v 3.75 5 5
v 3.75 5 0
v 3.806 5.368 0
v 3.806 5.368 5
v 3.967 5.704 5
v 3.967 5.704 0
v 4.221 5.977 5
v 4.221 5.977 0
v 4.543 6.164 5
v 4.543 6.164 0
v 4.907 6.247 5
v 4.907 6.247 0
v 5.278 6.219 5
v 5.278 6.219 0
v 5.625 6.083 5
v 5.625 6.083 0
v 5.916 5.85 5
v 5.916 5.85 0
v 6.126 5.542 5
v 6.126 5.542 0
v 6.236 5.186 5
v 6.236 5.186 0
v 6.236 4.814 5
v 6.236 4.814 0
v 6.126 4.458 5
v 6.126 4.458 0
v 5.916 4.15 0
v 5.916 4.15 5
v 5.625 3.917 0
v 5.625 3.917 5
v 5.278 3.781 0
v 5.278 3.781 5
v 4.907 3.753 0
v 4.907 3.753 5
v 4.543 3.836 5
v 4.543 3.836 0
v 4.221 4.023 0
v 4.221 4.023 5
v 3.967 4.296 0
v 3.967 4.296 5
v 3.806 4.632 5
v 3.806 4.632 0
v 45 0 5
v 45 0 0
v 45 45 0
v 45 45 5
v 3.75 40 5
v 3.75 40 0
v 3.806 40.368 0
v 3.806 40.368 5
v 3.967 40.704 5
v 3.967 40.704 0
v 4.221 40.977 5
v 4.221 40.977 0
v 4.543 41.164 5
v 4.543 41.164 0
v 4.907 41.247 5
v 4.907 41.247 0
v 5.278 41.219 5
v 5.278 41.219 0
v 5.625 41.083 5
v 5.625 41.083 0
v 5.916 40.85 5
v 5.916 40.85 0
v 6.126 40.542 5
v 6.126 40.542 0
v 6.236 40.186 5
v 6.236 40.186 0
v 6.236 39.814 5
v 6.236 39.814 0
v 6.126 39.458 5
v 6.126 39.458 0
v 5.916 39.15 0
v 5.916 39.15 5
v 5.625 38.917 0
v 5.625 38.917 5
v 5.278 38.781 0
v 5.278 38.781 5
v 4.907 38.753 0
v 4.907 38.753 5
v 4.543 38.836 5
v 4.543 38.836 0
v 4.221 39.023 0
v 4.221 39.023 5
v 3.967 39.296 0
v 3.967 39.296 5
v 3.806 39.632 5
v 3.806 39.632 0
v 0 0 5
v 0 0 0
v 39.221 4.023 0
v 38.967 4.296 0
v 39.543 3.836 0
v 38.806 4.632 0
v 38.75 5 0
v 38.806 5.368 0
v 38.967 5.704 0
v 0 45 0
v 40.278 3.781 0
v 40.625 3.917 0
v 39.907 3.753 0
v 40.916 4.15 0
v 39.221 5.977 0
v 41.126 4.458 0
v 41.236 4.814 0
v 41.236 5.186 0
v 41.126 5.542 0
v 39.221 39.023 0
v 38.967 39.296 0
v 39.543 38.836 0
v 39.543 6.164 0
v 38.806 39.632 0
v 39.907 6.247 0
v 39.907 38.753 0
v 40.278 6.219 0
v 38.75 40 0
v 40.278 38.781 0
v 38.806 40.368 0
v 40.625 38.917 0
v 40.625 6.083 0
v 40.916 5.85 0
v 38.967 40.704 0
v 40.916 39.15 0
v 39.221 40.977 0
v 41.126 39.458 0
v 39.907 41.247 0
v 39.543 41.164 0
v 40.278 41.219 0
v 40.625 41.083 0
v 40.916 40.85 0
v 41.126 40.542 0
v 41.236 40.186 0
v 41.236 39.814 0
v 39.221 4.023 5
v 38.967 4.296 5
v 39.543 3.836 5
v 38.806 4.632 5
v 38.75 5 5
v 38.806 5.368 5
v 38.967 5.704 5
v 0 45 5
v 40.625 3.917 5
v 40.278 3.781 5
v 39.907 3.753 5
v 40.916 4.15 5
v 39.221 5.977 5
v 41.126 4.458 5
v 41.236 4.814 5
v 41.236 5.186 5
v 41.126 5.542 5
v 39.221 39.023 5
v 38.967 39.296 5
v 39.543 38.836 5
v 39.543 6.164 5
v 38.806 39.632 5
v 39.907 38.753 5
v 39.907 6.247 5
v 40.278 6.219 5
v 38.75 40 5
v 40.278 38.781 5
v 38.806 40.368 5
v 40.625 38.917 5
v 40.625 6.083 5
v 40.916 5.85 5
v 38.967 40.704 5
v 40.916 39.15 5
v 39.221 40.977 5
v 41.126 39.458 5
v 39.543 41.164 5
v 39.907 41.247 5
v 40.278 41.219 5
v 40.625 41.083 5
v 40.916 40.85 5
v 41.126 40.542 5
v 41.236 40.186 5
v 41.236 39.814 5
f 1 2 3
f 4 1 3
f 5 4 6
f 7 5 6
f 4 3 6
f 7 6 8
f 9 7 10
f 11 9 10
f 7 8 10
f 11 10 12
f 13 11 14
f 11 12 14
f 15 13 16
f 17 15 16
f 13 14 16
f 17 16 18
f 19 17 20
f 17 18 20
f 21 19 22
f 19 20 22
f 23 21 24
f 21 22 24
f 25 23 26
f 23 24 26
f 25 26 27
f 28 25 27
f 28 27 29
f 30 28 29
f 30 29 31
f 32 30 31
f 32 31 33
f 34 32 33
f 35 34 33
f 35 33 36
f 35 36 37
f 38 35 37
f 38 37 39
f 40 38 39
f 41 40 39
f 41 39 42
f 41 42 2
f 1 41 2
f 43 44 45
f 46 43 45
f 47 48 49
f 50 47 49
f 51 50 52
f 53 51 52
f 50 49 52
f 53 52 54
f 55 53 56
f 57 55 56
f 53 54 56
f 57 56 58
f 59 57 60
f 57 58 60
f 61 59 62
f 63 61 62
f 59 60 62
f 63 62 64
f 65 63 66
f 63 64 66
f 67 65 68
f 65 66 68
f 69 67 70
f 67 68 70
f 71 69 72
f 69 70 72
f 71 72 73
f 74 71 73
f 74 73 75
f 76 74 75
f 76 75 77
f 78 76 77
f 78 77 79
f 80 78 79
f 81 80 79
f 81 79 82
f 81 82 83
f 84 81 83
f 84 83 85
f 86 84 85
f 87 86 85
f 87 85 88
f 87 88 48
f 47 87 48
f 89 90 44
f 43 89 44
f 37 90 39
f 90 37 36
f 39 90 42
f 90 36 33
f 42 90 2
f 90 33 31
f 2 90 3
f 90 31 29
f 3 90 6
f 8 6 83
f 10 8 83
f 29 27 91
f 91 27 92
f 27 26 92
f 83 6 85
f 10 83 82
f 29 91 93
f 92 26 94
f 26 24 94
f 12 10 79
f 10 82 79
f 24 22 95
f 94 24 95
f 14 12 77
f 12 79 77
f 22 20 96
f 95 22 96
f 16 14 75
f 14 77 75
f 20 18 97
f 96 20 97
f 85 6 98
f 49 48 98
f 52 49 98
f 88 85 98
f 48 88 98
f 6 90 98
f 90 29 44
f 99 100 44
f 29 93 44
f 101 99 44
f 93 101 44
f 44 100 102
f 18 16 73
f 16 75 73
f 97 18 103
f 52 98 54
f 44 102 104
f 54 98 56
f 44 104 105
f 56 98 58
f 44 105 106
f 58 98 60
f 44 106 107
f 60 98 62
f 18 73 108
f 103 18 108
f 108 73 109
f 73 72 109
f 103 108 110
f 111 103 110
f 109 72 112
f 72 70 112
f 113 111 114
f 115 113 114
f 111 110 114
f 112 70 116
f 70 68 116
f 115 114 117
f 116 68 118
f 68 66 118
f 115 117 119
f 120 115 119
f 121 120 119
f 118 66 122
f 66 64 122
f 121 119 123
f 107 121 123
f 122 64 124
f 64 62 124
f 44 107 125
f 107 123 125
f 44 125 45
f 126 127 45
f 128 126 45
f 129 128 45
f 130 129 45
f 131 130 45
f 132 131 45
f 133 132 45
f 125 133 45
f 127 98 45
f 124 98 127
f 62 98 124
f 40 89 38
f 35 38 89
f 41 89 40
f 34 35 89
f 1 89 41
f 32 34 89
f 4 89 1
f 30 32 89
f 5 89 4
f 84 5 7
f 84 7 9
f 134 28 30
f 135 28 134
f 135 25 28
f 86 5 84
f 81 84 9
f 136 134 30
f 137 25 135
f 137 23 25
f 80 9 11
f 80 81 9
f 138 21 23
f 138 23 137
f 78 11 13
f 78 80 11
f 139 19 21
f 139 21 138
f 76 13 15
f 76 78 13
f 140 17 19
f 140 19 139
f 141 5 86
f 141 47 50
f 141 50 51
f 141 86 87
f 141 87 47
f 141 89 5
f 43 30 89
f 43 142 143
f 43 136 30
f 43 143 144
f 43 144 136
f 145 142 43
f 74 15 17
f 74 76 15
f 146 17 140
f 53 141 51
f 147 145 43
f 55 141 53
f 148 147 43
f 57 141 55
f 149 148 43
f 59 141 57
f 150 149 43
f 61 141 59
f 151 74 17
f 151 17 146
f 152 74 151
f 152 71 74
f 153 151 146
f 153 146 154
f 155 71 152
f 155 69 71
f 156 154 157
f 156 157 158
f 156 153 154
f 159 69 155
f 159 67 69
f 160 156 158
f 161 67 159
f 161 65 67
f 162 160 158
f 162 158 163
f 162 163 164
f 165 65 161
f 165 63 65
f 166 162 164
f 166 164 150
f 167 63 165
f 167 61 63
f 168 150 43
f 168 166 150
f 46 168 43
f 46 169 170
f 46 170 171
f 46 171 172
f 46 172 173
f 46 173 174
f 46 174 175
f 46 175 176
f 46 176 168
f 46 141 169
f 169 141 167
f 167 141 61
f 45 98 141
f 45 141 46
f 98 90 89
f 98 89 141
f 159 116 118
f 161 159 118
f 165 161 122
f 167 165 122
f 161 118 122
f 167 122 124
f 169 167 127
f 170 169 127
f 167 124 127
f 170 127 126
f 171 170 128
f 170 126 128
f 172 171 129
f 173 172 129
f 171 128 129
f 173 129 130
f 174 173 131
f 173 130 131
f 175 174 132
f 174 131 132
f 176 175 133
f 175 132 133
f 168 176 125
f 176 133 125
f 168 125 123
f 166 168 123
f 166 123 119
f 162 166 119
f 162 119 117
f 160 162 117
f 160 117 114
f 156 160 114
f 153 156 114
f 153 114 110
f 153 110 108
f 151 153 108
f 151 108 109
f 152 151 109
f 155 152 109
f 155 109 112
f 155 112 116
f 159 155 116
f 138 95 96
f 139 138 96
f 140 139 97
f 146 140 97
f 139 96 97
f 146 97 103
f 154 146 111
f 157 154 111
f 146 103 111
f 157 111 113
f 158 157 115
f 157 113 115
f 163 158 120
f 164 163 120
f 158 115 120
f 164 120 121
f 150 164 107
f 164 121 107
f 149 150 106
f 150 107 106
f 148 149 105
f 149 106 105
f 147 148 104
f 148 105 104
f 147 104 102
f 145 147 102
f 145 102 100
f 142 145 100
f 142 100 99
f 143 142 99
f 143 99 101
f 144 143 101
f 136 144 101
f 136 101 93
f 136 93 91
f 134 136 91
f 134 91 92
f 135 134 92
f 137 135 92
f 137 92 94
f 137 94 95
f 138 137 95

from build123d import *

# Parameters (mm, degrees)
ESQUISSE1_W                                   = 45
ESQUISSE1_H                                   = 45
BOSS_EXTRU_1_DEPTH                            = 5
TROU_POUR_TARAUDAGE_POUR_TROU_TARAUD_M3_D     = 2.5
TROU_POUR_TARAUDAGE_POUR_TROU_TARAUD_M3_DEPTH = 10
TROU_POUR_TARAUDAGE_POUR_TROU_TARAUD_M3_TIP   = 0.751075774


with BuildPart() as part:
    # Esquisse1 → Boss.-Extru.1 (new body)
    with BuildSketch(Plane.XY):
        with Locations((22.5, 22.5)):
            Rectangle(ESQUISSE1_W, ESQUISSE1_H)
    extrude(amount=BOSS_EXTRU_1_DEPTH)

    # Trou pour taraudage pour trou taraudé M3x0.51
    with Locations(Plane.XY.offset(5)):
        with Locations((5, 40), (40, 5), (40, 40), (5, 5)):
            Hole(TROU_POUR_TARAUDAGE_POUR_TROU_TARAUD_M3_D / 2, depth=TROU_POUR_TARAUDAGE_POUR_TROU_TARAUD_M3_DEPTH)
            with Locations((0, 0, -(TROU_POUR_TARAUDAGE_POUR_TROU_TARAUD_M3_DEPTH + TROU_POUR_TARAUDAGE_POUR_TROU_TARAUD_M3_TIP / 2))):  # 118° drill point
                Cone(0, TROU_POUR_TARAUDAGE_POUR_TROU_TARAUD_M3_D / 2, TROU_POUR_TARAUDAGE_POUR_TROU_TARAUD_M3_TIP, mode=Mode.SUBTRACT)


solid = part.part
